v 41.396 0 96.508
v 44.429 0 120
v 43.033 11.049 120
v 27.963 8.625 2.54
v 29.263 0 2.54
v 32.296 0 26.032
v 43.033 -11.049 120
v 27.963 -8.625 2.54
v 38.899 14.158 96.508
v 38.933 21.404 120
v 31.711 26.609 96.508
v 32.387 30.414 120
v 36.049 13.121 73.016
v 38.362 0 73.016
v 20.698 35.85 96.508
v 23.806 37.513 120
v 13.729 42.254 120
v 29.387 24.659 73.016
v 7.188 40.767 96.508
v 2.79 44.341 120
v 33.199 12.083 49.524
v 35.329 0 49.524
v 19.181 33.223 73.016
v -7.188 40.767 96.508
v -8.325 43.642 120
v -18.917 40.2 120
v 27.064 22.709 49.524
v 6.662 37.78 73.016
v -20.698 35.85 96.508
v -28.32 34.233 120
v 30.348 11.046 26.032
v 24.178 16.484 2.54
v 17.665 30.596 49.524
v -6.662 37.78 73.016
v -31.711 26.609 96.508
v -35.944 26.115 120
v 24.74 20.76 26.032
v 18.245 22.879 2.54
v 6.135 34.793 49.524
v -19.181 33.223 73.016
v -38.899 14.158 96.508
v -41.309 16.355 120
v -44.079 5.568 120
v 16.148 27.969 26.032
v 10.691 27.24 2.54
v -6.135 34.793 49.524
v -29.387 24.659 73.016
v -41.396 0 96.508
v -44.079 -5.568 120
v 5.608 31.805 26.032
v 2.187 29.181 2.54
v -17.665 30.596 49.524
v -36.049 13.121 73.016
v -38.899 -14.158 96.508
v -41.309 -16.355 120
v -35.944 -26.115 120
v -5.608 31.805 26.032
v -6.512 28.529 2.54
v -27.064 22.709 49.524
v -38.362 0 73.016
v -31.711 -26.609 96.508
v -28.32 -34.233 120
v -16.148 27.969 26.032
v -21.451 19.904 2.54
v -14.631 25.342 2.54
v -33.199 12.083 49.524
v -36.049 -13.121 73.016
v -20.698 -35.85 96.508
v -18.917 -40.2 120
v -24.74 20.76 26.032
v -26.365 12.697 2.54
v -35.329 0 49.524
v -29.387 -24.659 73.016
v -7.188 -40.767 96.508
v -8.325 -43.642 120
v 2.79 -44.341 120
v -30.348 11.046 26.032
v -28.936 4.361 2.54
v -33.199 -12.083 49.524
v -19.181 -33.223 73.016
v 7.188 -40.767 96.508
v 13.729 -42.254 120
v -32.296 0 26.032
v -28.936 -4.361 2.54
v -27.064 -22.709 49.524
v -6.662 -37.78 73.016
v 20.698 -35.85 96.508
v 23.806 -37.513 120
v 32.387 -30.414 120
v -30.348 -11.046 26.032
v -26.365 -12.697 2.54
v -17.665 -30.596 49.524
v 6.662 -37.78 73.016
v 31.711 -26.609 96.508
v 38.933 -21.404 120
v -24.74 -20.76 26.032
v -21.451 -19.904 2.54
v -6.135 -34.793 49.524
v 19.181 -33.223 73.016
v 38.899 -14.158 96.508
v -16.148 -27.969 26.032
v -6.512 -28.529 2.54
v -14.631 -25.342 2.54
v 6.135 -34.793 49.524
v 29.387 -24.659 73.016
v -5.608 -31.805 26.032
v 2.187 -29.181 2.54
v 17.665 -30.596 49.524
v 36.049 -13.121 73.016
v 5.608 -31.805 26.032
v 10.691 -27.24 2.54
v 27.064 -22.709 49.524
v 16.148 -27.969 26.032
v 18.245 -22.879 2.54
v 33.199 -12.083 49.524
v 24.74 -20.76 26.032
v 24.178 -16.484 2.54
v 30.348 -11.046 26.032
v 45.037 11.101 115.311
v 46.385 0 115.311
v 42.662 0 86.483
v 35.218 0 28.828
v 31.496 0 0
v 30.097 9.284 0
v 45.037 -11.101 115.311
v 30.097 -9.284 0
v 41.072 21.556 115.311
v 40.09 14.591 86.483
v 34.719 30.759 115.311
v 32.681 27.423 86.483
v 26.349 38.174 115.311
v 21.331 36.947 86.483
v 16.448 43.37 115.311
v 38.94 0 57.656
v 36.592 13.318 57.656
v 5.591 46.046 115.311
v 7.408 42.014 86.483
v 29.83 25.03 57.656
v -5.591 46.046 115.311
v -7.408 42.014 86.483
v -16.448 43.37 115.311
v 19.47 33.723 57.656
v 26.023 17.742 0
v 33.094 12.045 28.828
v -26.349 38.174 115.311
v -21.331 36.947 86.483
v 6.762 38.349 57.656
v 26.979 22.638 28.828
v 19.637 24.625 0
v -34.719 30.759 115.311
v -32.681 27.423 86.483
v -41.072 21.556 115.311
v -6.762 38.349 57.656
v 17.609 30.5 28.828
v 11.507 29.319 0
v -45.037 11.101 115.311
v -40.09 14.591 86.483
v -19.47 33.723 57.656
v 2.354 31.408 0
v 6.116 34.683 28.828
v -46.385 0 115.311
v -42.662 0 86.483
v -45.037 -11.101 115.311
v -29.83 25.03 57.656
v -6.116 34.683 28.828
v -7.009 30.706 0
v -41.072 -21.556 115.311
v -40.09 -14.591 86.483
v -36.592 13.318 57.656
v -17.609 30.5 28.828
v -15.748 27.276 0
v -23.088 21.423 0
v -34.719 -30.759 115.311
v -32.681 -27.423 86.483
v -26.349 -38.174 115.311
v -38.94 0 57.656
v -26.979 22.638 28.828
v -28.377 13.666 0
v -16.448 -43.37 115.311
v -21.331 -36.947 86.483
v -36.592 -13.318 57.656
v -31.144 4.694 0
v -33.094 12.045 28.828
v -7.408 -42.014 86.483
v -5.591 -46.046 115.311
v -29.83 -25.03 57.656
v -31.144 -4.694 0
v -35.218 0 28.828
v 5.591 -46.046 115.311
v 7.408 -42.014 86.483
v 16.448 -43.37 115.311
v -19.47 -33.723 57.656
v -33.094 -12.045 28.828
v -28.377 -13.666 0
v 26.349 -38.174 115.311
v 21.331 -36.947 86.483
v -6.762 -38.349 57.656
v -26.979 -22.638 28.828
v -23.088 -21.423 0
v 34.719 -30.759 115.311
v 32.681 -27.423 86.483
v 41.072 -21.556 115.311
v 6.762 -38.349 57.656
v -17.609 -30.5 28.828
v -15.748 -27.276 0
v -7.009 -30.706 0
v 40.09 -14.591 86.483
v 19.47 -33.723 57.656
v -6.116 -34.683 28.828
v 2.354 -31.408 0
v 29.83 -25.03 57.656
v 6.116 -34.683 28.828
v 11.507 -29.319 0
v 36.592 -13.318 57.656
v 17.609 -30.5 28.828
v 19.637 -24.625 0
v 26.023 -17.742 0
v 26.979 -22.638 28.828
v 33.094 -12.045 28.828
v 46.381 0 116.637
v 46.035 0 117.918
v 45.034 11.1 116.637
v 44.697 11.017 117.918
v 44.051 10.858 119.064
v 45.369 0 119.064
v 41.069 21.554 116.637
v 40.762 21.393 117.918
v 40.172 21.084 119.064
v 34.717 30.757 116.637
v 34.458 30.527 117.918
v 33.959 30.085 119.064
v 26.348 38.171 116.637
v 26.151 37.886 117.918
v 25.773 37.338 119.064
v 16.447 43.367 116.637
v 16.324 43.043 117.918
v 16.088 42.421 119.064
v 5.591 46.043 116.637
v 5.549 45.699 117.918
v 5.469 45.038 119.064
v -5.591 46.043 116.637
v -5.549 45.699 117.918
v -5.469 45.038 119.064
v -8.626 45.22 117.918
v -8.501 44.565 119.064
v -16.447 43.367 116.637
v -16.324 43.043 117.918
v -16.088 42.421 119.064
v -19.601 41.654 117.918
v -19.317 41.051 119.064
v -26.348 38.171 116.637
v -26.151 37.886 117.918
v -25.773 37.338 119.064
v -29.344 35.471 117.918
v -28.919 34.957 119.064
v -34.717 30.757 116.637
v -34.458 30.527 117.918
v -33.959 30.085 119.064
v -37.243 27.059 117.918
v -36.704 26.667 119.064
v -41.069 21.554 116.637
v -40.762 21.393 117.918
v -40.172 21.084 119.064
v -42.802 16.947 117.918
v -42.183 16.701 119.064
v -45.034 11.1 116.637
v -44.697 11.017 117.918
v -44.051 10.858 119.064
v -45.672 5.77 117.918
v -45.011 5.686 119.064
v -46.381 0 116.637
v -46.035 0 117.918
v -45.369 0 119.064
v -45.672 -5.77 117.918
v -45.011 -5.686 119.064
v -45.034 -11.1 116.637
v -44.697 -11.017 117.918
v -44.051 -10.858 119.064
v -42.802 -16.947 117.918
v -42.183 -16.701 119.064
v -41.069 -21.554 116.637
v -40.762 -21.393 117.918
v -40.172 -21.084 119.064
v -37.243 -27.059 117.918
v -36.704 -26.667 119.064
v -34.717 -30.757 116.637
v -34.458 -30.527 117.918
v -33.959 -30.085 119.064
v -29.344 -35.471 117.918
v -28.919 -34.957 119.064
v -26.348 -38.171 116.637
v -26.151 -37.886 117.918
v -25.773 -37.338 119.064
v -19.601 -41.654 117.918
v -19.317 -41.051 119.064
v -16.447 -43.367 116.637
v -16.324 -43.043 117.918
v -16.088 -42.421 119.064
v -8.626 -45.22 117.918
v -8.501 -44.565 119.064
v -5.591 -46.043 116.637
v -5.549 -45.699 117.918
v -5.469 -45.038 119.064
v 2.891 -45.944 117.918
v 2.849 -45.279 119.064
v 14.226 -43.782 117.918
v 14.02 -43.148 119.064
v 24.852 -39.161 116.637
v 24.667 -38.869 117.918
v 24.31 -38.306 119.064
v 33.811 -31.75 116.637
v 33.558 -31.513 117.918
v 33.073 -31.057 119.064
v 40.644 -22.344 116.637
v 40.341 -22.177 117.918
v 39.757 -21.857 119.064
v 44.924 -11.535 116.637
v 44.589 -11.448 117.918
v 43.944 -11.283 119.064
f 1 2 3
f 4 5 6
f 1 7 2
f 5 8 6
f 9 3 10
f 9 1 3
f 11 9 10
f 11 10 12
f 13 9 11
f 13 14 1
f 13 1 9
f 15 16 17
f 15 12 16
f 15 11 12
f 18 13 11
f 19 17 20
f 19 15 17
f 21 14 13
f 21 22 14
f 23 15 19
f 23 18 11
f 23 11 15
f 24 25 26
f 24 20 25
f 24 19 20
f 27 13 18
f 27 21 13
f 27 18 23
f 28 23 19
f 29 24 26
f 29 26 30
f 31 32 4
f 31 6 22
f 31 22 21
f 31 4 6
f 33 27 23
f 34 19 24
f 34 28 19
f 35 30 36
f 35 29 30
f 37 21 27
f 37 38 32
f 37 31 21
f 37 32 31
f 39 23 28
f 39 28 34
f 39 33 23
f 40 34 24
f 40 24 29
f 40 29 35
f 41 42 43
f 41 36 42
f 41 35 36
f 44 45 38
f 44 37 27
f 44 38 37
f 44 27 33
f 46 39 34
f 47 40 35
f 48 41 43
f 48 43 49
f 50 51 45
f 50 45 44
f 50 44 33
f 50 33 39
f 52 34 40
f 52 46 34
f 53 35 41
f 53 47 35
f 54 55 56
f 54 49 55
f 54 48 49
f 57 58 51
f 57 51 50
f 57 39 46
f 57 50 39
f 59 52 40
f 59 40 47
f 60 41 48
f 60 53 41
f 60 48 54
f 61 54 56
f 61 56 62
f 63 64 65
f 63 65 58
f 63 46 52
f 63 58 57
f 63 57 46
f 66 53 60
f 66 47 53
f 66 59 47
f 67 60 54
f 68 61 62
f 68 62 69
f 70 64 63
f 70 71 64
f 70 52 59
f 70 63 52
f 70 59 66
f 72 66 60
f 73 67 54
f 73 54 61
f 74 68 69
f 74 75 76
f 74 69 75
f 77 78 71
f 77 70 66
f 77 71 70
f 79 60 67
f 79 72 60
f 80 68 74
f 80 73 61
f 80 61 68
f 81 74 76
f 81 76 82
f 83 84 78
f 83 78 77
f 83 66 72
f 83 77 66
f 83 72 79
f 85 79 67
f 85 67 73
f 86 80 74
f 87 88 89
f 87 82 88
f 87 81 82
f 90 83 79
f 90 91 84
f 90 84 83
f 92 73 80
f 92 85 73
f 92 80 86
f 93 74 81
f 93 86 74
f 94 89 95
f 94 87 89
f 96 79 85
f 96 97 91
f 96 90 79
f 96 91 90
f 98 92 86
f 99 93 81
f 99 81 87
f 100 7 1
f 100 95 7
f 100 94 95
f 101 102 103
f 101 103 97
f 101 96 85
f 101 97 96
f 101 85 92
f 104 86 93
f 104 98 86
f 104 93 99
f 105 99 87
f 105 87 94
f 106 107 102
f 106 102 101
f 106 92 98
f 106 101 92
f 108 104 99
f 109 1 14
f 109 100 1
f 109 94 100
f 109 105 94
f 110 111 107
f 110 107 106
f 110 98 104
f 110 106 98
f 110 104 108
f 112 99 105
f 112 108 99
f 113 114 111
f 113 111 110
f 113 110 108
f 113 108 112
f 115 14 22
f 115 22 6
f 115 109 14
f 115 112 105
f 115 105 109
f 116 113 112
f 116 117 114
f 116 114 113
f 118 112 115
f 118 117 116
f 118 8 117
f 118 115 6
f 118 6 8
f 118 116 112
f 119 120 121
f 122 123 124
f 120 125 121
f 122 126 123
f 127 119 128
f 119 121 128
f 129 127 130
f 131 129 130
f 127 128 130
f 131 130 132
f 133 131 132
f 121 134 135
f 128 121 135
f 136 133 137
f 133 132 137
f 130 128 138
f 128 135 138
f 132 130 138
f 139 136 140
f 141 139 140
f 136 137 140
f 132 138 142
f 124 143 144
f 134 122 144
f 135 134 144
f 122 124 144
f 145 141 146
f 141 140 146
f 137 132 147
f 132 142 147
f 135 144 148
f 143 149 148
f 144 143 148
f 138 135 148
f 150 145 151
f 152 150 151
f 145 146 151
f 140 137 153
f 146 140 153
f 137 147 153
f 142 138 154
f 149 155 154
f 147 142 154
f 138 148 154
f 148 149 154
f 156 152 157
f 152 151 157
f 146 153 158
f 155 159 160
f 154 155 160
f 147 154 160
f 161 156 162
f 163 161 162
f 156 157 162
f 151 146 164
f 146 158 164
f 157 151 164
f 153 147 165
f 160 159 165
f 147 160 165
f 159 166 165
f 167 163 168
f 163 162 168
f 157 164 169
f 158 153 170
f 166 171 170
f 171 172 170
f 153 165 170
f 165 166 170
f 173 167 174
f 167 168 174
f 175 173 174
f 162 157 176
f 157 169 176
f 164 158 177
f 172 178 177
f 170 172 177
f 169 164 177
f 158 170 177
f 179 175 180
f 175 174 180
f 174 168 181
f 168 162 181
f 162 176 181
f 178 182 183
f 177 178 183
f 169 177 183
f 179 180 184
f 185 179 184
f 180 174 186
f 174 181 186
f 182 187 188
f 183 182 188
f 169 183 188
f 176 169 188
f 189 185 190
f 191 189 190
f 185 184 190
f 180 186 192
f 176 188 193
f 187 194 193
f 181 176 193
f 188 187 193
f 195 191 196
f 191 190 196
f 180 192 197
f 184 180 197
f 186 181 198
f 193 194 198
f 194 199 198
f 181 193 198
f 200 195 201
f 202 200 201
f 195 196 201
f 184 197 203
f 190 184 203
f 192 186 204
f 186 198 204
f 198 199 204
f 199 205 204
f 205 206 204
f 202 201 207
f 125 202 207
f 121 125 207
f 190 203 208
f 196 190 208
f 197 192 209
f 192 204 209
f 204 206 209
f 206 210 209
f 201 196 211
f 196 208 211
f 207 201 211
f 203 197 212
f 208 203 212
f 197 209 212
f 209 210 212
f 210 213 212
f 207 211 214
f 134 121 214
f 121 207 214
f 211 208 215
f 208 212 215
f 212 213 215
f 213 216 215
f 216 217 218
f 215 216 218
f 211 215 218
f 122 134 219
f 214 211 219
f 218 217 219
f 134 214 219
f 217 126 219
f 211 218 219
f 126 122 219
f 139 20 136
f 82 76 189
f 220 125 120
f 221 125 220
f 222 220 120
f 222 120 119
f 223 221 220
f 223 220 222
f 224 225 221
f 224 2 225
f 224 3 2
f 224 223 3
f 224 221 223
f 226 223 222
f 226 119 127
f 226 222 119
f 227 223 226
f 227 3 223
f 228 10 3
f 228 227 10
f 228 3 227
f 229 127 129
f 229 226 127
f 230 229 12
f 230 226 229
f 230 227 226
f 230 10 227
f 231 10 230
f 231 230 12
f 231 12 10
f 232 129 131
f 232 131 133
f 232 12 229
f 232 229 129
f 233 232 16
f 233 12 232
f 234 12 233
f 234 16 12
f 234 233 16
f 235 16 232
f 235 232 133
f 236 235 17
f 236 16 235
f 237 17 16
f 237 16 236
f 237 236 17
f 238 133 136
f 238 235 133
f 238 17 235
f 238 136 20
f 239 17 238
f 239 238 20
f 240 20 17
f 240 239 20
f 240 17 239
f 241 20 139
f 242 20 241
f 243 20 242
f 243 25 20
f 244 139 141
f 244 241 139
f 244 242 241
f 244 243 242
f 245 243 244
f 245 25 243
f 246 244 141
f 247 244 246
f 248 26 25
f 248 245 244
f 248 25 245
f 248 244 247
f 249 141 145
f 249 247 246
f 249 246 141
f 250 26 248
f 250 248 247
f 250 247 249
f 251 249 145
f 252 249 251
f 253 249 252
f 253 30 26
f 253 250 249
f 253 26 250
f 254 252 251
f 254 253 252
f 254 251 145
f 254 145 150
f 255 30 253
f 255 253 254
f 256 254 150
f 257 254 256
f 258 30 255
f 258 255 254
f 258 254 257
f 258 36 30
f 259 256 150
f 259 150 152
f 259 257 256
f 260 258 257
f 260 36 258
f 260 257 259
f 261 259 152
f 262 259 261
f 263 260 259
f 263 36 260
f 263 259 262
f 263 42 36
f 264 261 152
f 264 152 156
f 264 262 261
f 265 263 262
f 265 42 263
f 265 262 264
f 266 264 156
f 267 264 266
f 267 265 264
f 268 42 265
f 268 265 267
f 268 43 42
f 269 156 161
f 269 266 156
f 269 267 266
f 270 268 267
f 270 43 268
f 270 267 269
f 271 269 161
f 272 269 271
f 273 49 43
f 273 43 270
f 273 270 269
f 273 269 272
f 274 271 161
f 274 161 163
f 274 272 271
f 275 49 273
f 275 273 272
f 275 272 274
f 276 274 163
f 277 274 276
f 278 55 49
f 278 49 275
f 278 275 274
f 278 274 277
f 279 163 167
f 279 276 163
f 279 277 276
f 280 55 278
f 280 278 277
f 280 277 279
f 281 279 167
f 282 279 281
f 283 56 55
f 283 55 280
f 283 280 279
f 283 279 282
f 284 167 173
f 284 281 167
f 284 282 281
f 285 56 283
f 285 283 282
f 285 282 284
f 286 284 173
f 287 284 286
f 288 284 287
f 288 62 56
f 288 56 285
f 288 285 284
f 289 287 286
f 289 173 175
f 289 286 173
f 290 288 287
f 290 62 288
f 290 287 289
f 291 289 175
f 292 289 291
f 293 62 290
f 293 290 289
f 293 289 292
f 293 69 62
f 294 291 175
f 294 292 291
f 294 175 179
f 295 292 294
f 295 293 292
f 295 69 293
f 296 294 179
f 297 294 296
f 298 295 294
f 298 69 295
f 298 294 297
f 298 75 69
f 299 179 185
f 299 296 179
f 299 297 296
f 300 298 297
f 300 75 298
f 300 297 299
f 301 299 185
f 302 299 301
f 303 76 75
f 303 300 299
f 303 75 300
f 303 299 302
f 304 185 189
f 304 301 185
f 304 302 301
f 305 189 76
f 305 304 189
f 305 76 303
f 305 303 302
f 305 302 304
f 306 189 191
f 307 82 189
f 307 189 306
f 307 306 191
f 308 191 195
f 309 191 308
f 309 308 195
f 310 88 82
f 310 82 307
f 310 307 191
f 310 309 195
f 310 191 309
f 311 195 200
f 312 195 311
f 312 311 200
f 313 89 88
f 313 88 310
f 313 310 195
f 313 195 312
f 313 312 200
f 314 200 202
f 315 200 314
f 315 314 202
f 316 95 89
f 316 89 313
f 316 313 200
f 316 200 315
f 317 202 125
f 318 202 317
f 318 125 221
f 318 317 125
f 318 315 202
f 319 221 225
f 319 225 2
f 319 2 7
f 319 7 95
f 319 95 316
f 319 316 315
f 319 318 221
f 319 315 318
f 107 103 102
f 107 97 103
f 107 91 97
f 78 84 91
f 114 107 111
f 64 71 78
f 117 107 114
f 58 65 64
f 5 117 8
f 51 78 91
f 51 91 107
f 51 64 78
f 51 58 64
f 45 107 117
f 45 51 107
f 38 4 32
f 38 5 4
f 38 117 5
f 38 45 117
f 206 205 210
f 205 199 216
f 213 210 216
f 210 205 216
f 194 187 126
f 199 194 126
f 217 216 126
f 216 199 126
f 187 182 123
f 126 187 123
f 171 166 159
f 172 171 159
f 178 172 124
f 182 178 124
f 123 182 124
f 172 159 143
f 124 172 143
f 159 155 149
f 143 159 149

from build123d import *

# Parameters (mm, degrees)
F2_R = 46.99
F0_R = 31.496
F4_T = -2.54


# Not quite as in the source:
# - a fillet or chamfer that OpenCascade refuses, or shapes differently, is made with other operations: its cross-section is extruded or revolved along the edge and cut away or added


with BuildPart() as f3:
    # F2 (on offset) → F3 section 0
    with BuildSketch(Plane.XY.offset(119.99976)):
        Circle(F2_R)
    # F0 (on Top) → F3 section 1
    with BuildSketch(Plane.XY):
        Circle(F0_R)
    loft()

    # F4
    f4_openings = [f3.faces().sort_by_distance(p)[0] for p in [
        (0, 0, 119.99976),
    ]]
    offset(amount=F4_T, openings=f4_openings, kind=Kind.INTERSECTION)

    # F5: fillet of radius 5.08 on 1 edges, made by hand

    # F5_s1 → F5_t2 (revolve, cut)
    with BuildSketch(Plane.XZ):
        with BuildLine():
            ThreePointArc((46.3846421913, 115.3113133911), (46.0349113946, 117.9175544409), (44.4289151153, 119.99976))
            Line((44.4289151153, 119.99976), (46.99, 119.99976))
            Line((46.99, 119.99976), (46.3846421913, 115.3113133911))
        make_face()
    revolve(axis=Axis((0, 0, 119.99976), (0, 0, 1)), mode=Mode.SUBTRACT)


solid = f3.part
